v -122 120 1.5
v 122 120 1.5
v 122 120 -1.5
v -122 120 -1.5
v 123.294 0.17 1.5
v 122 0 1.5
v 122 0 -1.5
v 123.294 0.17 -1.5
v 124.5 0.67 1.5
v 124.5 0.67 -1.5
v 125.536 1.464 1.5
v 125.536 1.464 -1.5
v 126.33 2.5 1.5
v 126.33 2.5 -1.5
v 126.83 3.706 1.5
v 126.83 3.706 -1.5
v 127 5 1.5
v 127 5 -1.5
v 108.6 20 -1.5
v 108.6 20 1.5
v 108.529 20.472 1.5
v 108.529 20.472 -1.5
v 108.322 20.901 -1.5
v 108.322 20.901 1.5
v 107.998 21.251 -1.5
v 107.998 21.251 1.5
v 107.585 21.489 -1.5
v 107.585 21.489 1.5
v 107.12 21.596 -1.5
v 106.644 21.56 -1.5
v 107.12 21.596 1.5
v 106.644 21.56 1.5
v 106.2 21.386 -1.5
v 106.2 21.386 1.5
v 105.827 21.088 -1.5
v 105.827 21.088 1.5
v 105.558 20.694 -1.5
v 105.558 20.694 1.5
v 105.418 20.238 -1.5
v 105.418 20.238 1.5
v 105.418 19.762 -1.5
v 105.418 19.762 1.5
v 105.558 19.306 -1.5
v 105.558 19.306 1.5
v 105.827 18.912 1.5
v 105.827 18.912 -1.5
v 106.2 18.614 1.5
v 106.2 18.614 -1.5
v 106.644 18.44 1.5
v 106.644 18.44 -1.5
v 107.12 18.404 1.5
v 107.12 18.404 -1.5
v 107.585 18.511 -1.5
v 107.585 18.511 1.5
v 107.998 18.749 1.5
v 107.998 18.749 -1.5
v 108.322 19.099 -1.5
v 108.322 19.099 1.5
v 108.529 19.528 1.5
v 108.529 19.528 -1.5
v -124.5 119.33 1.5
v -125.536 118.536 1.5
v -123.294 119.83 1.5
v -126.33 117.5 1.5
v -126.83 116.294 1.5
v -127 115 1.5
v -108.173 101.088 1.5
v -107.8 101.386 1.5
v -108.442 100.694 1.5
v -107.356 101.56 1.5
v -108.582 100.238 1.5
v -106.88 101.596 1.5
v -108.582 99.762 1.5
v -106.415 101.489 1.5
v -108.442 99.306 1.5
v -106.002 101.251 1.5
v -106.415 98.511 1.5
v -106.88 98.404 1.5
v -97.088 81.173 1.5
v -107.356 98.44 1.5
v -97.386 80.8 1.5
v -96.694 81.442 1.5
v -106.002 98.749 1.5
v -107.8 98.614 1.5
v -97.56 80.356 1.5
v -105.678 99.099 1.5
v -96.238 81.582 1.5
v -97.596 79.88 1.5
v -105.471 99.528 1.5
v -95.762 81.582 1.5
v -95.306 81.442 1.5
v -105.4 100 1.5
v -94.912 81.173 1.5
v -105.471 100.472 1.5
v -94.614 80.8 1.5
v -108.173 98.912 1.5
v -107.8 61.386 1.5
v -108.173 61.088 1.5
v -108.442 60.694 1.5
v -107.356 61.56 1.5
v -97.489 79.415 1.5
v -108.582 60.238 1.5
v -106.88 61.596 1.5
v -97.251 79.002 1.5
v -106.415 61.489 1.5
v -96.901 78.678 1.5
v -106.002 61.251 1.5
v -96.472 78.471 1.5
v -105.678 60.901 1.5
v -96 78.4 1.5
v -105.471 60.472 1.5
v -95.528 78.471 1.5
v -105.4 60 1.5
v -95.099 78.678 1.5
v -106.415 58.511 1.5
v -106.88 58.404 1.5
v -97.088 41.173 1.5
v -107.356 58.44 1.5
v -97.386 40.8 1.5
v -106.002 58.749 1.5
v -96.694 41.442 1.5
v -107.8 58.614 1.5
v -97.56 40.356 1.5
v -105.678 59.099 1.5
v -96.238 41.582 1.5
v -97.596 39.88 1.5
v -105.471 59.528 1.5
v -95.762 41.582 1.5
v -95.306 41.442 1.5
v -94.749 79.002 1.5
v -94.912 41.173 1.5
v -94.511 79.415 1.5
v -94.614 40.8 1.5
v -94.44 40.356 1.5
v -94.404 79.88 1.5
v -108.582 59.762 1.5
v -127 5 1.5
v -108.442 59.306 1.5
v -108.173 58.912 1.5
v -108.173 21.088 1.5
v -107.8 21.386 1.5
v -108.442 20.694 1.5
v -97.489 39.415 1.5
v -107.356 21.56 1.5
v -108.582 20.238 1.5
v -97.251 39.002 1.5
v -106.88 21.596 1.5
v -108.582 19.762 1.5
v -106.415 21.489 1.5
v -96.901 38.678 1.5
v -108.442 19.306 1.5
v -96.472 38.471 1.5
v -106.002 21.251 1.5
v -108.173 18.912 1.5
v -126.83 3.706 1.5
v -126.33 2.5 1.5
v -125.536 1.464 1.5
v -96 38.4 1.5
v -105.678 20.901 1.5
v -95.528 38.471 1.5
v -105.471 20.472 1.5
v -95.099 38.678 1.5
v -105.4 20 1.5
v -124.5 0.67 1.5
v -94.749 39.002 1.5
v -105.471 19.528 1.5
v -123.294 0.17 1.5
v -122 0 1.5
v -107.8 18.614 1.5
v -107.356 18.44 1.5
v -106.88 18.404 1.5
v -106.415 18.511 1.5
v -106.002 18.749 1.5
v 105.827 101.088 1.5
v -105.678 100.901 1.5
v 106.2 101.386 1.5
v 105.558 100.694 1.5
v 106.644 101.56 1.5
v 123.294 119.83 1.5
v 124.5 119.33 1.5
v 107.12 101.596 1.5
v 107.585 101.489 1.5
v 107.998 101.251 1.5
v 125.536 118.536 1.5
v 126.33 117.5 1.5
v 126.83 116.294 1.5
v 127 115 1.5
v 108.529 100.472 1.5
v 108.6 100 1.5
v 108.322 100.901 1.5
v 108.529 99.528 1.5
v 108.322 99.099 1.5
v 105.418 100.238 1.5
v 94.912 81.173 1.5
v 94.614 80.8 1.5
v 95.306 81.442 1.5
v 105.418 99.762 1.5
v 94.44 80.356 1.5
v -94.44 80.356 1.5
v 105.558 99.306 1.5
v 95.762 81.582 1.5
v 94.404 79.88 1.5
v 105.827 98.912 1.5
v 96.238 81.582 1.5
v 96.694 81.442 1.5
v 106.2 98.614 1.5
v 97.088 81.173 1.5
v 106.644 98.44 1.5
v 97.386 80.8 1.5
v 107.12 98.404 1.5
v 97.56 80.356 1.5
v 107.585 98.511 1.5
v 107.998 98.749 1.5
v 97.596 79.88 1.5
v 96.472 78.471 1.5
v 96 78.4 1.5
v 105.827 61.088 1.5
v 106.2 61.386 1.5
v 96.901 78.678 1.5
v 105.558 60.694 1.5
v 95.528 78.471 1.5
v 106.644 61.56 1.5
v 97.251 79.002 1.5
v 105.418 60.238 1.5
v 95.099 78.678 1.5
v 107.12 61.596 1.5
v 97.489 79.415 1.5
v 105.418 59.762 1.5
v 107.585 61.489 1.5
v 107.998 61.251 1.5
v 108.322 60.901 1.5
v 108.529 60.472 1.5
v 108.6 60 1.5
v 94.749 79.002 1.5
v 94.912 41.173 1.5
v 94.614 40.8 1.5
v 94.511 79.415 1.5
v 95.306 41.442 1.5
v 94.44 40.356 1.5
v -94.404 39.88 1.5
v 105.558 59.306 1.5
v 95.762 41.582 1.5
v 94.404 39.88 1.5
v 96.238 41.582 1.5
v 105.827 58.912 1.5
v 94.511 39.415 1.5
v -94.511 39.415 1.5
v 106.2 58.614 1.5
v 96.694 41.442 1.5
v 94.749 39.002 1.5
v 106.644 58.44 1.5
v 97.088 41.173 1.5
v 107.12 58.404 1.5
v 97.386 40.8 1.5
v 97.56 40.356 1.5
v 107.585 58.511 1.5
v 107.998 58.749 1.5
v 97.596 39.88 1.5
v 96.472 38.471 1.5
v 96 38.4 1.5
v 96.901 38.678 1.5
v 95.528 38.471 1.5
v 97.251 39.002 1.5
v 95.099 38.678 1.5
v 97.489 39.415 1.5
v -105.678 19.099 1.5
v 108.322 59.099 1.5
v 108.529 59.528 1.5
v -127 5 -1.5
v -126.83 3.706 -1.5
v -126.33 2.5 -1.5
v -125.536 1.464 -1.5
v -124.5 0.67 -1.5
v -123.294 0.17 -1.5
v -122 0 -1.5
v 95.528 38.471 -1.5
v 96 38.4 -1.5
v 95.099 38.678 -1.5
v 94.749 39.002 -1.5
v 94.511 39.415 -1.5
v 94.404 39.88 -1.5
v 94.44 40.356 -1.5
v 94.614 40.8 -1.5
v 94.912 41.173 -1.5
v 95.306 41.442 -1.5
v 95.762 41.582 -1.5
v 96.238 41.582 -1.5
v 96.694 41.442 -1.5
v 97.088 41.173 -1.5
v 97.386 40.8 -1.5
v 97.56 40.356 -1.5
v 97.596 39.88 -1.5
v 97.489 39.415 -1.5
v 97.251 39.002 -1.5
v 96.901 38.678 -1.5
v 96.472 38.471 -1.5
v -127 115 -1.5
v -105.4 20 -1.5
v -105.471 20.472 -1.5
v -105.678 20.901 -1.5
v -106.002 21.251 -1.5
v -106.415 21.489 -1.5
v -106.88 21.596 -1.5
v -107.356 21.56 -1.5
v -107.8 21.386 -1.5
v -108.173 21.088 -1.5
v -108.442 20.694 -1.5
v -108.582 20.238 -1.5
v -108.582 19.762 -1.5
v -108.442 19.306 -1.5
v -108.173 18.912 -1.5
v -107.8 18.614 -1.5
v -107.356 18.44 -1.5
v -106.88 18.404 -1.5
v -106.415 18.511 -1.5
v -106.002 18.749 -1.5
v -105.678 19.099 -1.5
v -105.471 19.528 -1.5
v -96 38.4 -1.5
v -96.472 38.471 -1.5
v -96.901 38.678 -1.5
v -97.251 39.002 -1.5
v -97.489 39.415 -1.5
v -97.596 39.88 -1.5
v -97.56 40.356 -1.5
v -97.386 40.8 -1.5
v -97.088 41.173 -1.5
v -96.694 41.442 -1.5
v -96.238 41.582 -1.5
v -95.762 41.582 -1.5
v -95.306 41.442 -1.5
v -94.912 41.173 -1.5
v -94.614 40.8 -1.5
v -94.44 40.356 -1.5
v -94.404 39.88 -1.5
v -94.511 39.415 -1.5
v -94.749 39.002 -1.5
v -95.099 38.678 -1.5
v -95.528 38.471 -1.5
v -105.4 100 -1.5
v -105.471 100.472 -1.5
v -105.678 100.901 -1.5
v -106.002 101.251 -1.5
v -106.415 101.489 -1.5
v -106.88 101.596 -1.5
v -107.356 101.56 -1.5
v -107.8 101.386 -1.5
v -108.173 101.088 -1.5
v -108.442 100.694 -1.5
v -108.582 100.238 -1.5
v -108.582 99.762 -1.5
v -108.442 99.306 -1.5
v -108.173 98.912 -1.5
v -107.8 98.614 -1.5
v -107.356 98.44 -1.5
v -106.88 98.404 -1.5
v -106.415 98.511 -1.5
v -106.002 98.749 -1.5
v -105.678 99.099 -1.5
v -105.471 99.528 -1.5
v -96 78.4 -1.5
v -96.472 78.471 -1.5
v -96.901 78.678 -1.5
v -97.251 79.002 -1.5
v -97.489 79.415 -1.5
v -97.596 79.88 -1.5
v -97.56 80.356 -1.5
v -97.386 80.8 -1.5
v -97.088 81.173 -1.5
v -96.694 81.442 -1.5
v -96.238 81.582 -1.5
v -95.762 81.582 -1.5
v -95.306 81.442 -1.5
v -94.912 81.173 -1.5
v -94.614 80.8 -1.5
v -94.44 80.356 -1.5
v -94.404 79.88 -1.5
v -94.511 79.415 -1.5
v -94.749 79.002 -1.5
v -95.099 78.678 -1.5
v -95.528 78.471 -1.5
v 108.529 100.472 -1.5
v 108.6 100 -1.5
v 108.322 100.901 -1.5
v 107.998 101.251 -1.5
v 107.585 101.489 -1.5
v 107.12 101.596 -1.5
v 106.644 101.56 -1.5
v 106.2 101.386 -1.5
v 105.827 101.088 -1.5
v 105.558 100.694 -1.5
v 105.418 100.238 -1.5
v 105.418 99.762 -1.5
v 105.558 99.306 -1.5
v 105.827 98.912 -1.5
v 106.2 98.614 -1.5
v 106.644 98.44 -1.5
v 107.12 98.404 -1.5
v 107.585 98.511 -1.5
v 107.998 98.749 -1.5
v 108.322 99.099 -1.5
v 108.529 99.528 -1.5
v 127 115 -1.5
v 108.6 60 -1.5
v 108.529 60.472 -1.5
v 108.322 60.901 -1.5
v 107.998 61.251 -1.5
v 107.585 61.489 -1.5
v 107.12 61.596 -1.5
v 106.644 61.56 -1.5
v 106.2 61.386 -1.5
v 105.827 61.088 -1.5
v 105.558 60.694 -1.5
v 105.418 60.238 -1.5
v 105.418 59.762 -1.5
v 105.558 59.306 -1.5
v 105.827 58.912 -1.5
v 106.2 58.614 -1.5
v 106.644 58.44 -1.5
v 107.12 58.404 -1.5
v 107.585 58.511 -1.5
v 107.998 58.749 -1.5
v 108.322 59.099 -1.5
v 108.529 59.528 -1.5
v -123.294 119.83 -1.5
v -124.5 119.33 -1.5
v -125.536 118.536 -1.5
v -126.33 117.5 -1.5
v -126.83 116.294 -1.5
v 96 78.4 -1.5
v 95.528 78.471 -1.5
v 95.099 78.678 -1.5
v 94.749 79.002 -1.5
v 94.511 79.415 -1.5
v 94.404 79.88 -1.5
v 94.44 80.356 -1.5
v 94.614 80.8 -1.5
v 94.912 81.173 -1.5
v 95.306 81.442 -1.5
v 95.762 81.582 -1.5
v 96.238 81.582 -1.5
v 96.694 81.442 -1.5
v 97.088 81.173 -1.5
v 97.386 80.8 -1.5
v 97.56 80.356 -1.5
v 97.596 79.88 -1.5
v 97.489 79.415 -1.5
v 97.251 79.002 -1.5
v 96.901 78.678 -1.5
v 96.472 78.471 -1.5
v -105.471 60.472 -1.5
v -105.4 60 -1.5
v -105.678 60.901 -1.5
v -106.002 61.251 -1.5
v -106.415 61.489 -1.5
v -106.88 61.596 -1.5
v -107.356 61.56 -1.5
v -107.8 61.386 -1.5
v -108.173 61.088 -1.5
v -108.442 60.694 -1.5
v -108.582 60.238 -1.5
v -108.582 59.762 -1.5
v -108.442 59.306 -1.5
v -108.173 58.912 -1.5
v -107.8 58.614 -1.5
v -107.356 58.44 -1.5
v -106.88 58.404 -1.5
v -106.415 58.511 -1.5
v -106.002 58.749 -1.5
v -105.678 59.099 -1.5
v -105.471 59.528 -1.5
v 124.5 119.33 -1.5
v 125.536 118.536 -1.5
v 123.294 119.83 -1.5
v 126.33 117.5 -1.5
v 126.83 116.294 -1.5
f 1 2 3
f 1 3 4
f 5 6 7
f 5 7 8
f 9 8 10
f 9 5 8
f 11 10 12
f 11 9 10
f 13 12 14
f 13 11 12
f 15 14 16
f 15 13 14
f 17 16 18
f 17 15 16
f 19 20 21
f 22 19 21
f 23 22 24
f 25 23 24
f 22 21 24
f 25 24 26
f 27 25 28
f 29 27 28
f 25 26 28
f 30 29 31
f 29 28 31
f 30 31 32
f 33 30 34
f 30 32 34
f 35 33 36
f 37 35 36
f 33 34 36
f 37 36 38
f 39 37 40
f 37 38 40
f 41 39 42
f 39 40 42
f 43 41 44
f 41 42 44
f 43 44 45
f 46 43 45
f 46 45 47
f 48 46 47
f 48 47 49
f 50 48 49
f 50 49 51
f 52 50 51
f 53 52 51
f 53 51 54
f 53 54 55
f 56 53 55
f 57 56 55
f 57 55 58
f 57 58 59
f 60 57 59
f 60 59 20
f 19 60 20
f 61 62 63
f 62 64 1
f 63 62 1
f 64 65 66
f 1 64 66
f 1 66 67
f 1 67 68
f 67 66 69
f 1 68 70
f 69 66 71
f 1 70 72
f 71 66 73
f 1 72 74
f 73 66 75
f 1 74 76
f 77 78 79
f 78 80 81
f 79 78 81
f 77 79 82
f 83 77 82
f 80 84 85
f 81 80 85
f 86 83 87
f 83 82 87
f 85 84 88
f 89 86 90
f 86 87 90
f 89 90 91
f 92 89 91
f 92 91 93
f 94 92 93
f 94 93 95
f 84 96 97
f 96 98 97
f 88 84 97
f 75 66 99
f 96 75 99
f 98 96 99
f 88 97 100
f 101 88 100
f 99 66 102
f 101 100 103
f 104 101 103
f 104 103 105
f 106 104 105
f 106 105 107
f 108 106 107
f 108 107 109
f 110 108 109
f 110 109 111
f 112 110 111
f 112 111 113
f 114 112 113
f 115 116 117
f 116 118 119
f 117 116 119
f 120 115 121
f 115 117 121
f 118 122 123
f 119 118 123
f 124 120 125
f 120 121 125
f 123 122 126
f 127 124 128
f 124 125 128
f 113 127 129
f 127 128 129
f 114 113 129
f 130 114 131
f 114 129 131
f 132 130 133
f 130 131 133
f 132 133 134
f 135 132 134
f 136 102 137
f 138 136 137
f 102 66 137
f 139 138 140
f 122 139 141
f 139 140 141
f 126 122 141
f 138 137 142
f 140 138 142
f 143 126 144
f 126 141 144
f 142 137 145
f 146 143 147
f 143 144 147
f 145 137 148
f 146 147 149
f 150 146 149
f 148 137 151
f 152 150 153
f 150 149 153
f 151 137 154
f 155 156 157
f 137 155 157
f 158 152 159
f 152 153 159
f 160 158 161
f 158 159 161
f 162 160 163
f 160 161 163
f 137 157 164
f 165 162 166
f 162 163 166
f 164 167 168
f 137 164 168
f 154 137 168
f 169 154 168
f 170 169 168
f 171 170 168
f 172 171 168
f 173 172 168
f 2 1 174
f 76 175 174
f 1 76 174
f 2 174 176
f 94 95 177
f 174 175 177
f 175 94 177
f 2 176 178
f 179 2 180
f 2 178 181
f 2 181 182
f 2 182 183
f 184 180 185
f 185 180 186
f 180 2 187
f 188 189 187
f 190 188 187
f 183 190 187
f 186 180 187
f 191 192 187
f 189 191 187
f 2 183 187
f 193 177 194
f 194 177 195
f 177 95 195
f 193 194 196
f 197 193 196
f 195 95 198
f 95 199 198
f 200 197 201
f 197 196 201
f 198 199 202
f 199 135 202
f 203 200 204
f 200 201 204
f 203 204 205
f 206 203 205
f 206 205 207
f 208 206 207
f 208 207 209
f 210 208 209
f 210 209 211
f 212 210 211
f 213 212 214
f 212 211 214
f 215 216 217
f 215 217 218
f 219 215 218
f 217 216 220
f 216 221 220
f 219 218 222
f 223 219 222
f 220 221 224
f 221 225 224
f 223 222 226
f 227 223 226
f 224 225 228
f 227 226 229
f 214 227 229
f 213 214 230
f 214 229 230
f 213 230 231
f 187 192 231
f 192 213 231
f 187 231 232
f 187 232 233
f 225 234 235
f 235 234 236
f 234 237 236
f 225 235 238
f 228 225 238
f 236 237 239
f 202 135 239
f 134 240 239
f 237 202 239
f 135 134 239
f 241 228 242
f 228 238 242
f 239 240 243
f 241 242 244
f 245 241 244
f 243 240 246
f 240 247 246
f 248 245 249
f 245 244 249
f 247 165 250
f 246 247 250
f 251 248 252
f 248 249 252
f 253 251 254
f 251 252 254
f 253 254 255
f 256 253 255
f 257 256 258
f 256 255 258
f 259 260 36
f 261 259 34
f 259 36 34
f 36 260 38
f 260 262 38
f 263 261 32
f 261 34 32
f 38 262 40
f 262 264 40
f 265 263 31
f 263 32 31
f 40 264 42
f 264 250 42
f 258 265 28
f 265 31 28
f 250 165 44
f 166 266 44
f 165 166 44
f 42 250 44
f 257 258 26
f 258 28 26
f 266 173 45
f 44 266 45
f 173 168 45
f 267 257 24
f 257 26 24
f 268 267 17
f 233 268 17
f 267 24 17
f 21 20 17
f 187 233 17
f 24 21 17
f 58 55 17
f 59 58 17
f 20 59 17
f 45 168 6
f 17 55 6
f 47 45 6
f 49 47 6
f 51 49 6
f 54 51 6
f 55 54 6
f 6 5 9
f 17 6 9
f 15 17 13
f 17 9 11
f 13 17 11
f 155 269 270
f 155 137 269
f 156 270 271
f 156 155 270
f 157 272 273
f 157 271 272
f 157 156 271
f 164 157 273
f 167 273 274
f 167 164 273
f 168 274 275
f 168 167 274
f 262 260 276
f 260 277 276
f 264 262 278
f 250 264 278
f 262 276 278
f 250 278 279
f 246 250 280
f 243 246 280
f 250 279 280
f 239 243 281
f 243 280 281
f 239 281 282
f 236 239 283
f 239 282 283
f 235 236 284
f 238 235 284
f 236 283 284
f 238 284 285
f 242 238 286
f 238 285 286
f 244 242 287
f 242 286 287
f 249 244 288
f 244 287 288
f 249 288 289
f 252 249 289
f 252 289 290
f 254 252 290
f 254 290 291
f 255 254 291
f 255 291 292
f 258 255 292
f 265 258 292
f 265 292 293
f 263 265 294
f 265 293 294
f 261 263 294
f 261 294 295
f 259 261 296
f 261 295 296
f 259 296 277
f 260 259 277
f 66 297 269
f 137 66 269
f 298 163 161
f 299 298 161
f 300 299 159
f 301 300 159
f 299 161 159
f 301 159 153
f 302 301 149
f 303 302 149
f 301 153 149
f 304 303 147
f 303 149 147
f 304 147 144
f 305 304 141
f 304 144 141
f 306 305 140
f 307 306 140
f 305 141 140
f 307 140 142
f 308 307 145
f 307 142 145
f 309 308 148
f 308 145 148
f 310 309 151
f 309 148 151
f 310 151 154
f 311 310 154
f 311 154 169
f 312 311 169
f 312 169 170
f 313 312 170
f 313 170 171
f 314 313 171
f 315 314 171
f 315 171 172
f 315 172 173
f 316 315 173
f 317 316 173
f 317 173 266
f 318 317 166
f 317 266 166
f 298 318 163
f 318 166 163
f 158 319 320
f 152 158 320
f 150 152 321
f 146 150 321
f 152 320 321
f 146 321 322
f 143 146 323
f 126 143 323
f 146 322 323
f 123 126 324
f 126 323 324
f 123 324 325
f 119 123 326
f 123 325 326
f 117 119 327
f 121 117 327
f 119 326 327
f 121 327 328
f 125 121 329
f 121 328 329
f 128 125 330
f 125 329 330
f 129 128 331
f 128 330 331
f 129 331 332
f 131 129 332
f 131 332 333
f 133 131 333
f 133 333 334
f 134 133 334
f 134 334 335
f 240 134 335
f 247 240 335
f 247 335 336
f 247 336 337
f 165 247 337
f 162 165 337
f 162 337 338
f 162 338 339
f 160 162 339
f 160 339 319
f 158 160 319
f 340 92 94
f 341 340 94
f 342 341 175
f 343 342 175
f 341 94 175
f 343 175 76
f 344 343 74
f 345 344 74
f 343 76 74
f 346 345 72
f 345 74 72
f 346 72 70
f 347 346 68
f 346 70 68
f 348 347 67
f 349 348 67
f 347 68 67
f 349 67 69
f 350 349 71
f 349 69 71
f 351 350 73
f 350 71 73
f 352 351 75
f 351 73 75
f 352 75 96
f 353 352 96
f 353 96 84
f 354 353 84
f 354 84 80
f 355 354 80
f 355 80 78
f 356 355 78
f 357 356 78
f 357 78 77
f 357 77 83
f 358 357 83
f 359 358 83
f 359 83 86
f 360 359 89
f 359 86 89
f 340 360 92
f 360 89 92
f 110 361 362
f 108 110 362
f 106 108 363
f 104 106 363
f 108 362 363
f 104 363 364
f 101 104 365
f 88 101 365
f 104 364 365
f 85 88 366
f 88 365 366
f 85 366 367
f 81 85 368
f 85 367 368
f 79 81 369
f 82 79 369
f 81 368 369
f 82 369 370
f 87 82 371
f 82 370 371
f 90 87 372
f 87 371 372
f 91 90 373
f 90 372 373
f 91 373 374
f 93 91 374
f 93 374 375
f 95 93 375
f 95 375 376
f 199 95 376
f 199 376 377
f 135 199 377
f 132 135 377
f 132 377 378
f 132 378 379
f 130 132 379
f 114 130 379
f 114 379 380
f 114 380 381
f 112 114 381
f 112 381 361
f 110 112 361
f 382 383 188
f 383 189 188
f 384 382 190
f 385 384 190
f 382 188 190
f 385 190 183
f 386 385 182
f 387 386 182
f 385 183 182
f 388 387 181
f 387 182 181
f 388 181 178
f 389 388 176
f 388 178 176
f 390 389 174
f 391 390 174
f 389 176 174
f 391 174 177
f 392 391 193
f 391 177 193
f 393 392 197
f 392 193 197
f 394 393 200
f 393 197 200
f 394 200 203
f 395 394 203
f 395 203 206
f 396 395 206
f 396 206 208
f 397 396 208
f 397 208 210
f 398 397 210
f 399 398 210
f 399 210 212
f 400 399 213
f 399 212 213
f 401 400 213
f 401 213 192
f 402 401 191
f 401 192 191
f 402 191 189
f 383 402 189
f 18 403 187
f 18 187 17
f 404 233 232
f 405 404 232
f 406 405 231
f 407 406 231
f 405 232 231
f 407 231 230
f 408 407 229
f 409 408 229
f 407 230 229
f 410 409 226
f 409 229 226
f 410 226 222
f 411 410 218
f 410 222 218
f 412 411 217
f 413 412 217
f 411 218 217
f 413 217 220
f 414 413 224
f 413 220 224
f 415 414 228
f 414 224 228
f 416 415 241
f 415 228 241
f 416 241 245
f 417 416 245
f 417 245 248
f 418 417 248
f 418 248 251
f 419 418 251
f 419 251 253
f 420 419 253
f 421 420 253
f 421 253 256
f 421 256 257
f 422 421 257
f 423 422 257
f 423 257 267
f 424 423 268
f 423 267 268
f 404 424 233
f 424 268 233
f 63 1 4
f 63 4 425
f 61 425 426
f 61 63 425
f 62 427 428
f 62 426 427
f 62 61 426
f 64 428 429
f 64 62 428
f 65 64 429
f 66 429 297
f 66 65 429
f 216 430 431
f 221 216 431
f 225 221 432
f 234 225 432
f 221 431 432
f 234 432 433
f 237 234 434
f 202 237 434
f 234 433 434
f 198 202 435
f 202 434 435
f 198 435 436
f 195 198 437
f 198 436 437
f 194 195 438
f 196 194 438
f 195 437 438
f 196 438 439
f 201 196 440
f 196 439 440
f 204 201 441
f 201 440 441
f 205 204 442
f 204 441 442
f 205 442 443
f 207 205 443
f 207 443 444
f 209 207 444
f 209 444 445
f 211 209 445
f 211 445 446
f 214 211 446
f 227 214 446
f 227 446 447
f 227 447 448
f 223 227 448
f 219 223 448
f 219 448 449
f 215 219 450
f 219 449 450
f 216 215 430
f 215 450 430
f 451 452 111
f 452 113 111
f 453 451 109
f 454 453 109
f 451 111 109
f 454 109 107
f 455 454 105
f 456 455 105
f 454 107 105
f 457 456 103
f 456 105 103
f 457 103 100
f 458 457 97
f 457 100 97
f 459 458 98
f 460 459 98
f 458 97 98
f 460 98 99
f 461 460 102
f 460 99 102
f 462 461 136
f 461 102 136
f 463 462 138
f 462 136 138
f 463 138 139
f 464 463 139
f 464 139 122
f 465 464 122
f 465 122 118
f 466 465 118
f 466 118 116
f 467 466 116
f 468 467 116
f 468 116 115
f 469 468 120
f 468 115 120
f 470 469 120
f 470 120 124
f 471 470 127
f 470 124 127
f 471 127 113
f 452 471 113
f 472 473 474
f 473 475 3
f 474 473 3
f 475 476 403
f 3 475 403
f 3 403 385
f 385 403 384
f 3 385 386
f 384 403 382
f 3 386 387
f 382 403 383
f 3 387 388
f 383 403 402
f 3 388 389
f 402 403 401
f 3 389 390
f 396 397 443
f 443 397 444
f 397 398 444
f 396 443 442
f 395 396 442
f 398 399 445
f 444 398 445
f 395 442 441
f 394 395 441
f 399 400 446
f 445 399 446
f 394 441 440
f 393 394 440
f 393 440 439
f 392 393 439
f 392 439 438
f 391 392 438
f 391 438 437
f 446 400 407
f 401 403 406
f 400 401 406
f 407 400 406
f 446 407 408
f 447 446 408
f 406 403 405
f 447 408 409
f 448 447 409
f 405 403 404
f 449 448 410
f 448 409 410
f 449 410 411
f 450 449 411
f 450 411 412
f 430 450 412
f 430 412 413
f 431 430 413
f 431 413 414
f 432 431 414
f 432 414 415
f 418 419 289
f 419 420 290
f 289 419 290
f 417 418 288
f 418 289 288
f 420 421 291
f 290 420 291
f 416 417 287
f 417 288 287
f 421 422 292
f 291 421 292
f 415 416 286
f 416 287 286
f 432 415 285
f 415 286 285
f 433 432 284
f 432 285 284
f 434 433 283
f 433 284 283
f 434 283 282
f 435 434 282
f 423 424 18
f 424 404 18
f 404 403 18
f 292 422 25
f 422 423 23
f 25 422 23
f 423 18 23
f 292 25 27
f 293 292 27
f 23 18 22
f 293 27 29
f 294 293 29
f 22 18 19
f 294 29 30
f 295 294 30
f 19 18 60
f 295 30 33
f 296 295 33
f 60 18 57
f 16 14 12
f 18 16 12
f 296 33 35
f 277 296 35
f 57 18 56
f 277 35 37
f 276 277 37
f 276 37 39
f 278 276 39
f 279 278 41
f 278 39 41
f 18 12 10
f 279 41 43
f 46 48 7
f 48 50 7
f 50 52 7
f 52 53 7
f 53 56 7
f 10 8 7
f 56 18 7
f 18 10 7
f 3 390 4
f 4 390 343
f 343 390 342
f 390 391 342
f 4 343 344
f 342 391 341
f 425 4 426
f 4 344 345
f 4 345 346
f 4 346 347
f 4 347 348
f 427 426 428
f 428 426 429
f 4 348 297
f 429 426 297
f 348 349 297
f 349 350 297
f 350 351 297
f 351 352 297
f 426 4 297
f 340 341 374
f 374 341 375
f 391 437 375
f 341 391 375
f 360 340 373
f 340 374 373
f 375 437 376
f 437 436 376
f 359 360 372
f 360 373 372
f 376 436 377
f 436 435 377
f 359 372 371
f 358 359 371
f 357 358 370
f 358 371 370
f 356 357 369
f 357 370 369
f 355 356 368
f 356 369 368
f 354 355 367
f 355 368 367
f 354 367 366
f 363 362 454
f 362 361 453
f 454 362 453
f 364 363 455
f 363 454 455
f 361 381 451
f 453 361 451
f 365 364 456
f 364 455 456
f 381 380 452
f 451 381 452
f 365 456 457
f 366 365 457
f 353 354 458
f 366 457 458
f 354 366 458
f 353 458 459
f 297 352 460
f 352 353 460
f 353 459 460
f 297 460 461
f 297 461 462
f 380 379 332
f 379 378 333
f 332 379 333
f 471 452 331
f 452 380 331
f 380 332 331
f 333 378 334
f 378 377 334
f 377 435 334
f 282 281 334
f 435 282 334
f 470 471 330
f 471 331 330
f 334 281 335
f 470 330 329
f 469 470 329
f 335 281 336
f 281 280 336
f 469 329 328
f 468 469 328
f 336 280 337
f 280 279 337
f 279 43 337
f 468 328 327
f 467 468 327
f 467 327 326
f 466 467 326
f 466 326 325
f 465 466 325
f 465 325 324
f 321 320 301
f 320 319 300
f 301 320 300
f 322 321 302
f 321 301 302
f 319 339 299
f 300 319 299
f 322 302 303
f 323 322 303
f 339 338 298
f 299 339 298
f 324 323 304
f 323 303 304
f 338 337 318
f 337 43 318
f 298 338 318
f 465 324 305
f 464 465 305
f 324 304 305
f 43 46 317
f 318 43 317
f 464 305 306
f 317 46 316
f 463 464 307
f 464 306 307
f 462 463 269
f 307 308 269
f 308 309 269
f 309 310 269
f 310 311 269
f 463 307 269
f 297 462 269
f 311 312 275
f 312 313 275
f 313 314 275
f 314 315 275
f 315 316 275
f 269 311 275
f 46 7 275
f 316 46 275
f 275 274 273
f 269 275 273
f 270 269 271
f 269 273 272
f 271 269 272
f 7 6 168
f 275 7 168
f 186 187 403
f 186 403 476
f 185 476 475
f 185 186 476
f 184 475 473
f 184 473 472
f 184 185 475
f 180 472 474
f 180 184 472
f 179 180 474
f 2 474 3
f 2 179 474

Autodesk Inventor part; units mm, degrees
ref_plane "YZ Plane" through (0, 0, 0) normal (1, 0, 0) x (0, 1, 0)
ref_plane "XZ Plane" through (0, 0, 0) normal (0, 1, 0) x (-1, 0, 0)
ref_plane "XY Plane" through (0, 0, 0) normal (0, 0, 1) x (1, 0, 0)
sketch "スケッチ1" plane through (0, 0, 0) normal (0, 1, 0) x (-1, 0, 0)
  line L0 (130, 1.5) -> (-130, 1.5)
  line L1 (-130, 1.5) -> (-130, -1.5)
  line L2 (-130, -1.5) -> (130, -1.5)
  line L3 (130, -1.5) -> (130, 1.5)
  line L4 (130, 1.5) -> (-130, -1.5) construction
  line L5 (-130, 1.5) -> (130, -1.5) construction
  point P0 (0, 0)
  dimension "d0" = 260
  dimension "d1" = 3
extrude "押し出し1" add sketch "スケッチ1" along normal blind 120
sketch "スケッチ5" plane through (130, 0, -1.5) normal (0, 0, -1) x (-1, 0, 0)
  line L0 (0, 0) -> (260, 0) projected
  line L1 (0, 120) -> (3, 120)
  line L2 (3, 120) -> (3, 0)
  line L3 (3, 0) -> (0, 0)
  line L4 (0, 0) -> (0, 120)
  line L5 (0, 105) -> (3, 105)
  line L6 (3, 105) -> (3, 15)
  line L7 (3, 15) -> (0, 15)
  line L8 (0, 15) -> (0, 105)
  line L9 (0, 120) -> (260, 120) projected
  line L10 (130, 120) -> (130, 0)
  line L11 (260, 0) -> (0, 0)
  line L12 (260, 120) -> (257, 120)
  line L13 (257, 120) -> (257, 0)
  line L14 (260, 0) -> (260, 120)
  line L15 (260, 105) -> (257, 105)
  line L16 (257, 15) -> (260, 15)
  point P0 (1.5, 105)
  point P1 (1.5, 120)
  point P2 (1.5, 15)
  point P3 (1.5, 0)
  point P4 (258.5, 15)
  point P5 (257, 0)
  point P6 (257, 120)
  point P7 (0, 15)
  point P8 (3, 105)
  dimension "d22" = 3
  dimension "d23" = 15
  dimension "d24" = 15
extrude "押し出し4" cut sketch "スケッチ5" against normal through all contours L4 L7 L2 L0 | L4 L5 L2 L7 | L4 L1 L2 L5 | L13 L16 L14 L0 | L13 L15 L14 L16 | L9 L14 L15 L13
sketch "スケッチ8" plane through (-127, 0, 1.5) normal (0, 0, 1) x (1, 0, 0)
  circle A0 centre (20, 100) radius 1.6
  circle A1 centre (20, 20) radius 1.6
  line L0 (0, 120) -> (0, 0) projected
  line L1 (0, 120) -> (254, 120) projected
  line L2 (0, 0) -> (254, 0) projected
  line L3 (127, 120) -> (127, 0)
  circle A2 centre (234, 100) radius 1.6
  circle A3 centre (234, 20) radius 1.6
  circle A4 centre (20, 60) radius 1.6
  circle A5 centre (234, 60) radius 1.6
  dimension "d31" = 20
  dimension "d32" = 20
  dimension "d33" = 20
  dimension "d34" = 20
  dimension "d35" = 3.2
  dimension "d36" = 3.2
  dimension "d73" = 3.2
  dimension "d74" = 40
  dimension "d75" = 20
extrude "押し出し7" cut sketch "スケッチ8" against normal through all contours A0 | A1 | A2 | A3 | A4 | A5
fillet "フィレット1" radius 5 4 edges at (-127, 120, 0) (-127, 0, 0) (127, 120, 0) (127, 0, 0)
sketch "スケッチ13" plane through (-122, 0, 1.5) normal (0, 0, 1) x (1, 0, 0)
  line L0 (244, 120) -> (0, 120) projected
  line L1 (122, 120) -> (122, 0)
  circle A0 centre (15, 100) radius 1.6 projected
  circle A1 centre (15, 20) radius 1.6 projected
  circle A2 centre (15, 60) radius 1.6 projected
  circle A3 centre (122, 60) radius 12.5 projected
  line L2 (122, 60) -> (122, 88.3789)
  point P0 (26, 80)
  point P1 (26, 40)
  point P2 (218, 80)
  point P3 (218, 40)
  dimension "d76" = 11
  dimension "d77" = 40
  dimension "d78" = 20
  dimension "d79" = 11
hole "穴1" at (-96, 80, 1.5) at (-96, 40, 1.5) at (96, 40, 1.5) at (96, 80, 1.5) direction (0, 0, -1) diameter 3.2 end through all
equation "\"d36\" = d35"
equation "\"d73\" = d35"
equation "\"d78\" = 0.5 * d77"
properties part number "BP_BOX-Back-120" material "アセタール樹脂、白"
